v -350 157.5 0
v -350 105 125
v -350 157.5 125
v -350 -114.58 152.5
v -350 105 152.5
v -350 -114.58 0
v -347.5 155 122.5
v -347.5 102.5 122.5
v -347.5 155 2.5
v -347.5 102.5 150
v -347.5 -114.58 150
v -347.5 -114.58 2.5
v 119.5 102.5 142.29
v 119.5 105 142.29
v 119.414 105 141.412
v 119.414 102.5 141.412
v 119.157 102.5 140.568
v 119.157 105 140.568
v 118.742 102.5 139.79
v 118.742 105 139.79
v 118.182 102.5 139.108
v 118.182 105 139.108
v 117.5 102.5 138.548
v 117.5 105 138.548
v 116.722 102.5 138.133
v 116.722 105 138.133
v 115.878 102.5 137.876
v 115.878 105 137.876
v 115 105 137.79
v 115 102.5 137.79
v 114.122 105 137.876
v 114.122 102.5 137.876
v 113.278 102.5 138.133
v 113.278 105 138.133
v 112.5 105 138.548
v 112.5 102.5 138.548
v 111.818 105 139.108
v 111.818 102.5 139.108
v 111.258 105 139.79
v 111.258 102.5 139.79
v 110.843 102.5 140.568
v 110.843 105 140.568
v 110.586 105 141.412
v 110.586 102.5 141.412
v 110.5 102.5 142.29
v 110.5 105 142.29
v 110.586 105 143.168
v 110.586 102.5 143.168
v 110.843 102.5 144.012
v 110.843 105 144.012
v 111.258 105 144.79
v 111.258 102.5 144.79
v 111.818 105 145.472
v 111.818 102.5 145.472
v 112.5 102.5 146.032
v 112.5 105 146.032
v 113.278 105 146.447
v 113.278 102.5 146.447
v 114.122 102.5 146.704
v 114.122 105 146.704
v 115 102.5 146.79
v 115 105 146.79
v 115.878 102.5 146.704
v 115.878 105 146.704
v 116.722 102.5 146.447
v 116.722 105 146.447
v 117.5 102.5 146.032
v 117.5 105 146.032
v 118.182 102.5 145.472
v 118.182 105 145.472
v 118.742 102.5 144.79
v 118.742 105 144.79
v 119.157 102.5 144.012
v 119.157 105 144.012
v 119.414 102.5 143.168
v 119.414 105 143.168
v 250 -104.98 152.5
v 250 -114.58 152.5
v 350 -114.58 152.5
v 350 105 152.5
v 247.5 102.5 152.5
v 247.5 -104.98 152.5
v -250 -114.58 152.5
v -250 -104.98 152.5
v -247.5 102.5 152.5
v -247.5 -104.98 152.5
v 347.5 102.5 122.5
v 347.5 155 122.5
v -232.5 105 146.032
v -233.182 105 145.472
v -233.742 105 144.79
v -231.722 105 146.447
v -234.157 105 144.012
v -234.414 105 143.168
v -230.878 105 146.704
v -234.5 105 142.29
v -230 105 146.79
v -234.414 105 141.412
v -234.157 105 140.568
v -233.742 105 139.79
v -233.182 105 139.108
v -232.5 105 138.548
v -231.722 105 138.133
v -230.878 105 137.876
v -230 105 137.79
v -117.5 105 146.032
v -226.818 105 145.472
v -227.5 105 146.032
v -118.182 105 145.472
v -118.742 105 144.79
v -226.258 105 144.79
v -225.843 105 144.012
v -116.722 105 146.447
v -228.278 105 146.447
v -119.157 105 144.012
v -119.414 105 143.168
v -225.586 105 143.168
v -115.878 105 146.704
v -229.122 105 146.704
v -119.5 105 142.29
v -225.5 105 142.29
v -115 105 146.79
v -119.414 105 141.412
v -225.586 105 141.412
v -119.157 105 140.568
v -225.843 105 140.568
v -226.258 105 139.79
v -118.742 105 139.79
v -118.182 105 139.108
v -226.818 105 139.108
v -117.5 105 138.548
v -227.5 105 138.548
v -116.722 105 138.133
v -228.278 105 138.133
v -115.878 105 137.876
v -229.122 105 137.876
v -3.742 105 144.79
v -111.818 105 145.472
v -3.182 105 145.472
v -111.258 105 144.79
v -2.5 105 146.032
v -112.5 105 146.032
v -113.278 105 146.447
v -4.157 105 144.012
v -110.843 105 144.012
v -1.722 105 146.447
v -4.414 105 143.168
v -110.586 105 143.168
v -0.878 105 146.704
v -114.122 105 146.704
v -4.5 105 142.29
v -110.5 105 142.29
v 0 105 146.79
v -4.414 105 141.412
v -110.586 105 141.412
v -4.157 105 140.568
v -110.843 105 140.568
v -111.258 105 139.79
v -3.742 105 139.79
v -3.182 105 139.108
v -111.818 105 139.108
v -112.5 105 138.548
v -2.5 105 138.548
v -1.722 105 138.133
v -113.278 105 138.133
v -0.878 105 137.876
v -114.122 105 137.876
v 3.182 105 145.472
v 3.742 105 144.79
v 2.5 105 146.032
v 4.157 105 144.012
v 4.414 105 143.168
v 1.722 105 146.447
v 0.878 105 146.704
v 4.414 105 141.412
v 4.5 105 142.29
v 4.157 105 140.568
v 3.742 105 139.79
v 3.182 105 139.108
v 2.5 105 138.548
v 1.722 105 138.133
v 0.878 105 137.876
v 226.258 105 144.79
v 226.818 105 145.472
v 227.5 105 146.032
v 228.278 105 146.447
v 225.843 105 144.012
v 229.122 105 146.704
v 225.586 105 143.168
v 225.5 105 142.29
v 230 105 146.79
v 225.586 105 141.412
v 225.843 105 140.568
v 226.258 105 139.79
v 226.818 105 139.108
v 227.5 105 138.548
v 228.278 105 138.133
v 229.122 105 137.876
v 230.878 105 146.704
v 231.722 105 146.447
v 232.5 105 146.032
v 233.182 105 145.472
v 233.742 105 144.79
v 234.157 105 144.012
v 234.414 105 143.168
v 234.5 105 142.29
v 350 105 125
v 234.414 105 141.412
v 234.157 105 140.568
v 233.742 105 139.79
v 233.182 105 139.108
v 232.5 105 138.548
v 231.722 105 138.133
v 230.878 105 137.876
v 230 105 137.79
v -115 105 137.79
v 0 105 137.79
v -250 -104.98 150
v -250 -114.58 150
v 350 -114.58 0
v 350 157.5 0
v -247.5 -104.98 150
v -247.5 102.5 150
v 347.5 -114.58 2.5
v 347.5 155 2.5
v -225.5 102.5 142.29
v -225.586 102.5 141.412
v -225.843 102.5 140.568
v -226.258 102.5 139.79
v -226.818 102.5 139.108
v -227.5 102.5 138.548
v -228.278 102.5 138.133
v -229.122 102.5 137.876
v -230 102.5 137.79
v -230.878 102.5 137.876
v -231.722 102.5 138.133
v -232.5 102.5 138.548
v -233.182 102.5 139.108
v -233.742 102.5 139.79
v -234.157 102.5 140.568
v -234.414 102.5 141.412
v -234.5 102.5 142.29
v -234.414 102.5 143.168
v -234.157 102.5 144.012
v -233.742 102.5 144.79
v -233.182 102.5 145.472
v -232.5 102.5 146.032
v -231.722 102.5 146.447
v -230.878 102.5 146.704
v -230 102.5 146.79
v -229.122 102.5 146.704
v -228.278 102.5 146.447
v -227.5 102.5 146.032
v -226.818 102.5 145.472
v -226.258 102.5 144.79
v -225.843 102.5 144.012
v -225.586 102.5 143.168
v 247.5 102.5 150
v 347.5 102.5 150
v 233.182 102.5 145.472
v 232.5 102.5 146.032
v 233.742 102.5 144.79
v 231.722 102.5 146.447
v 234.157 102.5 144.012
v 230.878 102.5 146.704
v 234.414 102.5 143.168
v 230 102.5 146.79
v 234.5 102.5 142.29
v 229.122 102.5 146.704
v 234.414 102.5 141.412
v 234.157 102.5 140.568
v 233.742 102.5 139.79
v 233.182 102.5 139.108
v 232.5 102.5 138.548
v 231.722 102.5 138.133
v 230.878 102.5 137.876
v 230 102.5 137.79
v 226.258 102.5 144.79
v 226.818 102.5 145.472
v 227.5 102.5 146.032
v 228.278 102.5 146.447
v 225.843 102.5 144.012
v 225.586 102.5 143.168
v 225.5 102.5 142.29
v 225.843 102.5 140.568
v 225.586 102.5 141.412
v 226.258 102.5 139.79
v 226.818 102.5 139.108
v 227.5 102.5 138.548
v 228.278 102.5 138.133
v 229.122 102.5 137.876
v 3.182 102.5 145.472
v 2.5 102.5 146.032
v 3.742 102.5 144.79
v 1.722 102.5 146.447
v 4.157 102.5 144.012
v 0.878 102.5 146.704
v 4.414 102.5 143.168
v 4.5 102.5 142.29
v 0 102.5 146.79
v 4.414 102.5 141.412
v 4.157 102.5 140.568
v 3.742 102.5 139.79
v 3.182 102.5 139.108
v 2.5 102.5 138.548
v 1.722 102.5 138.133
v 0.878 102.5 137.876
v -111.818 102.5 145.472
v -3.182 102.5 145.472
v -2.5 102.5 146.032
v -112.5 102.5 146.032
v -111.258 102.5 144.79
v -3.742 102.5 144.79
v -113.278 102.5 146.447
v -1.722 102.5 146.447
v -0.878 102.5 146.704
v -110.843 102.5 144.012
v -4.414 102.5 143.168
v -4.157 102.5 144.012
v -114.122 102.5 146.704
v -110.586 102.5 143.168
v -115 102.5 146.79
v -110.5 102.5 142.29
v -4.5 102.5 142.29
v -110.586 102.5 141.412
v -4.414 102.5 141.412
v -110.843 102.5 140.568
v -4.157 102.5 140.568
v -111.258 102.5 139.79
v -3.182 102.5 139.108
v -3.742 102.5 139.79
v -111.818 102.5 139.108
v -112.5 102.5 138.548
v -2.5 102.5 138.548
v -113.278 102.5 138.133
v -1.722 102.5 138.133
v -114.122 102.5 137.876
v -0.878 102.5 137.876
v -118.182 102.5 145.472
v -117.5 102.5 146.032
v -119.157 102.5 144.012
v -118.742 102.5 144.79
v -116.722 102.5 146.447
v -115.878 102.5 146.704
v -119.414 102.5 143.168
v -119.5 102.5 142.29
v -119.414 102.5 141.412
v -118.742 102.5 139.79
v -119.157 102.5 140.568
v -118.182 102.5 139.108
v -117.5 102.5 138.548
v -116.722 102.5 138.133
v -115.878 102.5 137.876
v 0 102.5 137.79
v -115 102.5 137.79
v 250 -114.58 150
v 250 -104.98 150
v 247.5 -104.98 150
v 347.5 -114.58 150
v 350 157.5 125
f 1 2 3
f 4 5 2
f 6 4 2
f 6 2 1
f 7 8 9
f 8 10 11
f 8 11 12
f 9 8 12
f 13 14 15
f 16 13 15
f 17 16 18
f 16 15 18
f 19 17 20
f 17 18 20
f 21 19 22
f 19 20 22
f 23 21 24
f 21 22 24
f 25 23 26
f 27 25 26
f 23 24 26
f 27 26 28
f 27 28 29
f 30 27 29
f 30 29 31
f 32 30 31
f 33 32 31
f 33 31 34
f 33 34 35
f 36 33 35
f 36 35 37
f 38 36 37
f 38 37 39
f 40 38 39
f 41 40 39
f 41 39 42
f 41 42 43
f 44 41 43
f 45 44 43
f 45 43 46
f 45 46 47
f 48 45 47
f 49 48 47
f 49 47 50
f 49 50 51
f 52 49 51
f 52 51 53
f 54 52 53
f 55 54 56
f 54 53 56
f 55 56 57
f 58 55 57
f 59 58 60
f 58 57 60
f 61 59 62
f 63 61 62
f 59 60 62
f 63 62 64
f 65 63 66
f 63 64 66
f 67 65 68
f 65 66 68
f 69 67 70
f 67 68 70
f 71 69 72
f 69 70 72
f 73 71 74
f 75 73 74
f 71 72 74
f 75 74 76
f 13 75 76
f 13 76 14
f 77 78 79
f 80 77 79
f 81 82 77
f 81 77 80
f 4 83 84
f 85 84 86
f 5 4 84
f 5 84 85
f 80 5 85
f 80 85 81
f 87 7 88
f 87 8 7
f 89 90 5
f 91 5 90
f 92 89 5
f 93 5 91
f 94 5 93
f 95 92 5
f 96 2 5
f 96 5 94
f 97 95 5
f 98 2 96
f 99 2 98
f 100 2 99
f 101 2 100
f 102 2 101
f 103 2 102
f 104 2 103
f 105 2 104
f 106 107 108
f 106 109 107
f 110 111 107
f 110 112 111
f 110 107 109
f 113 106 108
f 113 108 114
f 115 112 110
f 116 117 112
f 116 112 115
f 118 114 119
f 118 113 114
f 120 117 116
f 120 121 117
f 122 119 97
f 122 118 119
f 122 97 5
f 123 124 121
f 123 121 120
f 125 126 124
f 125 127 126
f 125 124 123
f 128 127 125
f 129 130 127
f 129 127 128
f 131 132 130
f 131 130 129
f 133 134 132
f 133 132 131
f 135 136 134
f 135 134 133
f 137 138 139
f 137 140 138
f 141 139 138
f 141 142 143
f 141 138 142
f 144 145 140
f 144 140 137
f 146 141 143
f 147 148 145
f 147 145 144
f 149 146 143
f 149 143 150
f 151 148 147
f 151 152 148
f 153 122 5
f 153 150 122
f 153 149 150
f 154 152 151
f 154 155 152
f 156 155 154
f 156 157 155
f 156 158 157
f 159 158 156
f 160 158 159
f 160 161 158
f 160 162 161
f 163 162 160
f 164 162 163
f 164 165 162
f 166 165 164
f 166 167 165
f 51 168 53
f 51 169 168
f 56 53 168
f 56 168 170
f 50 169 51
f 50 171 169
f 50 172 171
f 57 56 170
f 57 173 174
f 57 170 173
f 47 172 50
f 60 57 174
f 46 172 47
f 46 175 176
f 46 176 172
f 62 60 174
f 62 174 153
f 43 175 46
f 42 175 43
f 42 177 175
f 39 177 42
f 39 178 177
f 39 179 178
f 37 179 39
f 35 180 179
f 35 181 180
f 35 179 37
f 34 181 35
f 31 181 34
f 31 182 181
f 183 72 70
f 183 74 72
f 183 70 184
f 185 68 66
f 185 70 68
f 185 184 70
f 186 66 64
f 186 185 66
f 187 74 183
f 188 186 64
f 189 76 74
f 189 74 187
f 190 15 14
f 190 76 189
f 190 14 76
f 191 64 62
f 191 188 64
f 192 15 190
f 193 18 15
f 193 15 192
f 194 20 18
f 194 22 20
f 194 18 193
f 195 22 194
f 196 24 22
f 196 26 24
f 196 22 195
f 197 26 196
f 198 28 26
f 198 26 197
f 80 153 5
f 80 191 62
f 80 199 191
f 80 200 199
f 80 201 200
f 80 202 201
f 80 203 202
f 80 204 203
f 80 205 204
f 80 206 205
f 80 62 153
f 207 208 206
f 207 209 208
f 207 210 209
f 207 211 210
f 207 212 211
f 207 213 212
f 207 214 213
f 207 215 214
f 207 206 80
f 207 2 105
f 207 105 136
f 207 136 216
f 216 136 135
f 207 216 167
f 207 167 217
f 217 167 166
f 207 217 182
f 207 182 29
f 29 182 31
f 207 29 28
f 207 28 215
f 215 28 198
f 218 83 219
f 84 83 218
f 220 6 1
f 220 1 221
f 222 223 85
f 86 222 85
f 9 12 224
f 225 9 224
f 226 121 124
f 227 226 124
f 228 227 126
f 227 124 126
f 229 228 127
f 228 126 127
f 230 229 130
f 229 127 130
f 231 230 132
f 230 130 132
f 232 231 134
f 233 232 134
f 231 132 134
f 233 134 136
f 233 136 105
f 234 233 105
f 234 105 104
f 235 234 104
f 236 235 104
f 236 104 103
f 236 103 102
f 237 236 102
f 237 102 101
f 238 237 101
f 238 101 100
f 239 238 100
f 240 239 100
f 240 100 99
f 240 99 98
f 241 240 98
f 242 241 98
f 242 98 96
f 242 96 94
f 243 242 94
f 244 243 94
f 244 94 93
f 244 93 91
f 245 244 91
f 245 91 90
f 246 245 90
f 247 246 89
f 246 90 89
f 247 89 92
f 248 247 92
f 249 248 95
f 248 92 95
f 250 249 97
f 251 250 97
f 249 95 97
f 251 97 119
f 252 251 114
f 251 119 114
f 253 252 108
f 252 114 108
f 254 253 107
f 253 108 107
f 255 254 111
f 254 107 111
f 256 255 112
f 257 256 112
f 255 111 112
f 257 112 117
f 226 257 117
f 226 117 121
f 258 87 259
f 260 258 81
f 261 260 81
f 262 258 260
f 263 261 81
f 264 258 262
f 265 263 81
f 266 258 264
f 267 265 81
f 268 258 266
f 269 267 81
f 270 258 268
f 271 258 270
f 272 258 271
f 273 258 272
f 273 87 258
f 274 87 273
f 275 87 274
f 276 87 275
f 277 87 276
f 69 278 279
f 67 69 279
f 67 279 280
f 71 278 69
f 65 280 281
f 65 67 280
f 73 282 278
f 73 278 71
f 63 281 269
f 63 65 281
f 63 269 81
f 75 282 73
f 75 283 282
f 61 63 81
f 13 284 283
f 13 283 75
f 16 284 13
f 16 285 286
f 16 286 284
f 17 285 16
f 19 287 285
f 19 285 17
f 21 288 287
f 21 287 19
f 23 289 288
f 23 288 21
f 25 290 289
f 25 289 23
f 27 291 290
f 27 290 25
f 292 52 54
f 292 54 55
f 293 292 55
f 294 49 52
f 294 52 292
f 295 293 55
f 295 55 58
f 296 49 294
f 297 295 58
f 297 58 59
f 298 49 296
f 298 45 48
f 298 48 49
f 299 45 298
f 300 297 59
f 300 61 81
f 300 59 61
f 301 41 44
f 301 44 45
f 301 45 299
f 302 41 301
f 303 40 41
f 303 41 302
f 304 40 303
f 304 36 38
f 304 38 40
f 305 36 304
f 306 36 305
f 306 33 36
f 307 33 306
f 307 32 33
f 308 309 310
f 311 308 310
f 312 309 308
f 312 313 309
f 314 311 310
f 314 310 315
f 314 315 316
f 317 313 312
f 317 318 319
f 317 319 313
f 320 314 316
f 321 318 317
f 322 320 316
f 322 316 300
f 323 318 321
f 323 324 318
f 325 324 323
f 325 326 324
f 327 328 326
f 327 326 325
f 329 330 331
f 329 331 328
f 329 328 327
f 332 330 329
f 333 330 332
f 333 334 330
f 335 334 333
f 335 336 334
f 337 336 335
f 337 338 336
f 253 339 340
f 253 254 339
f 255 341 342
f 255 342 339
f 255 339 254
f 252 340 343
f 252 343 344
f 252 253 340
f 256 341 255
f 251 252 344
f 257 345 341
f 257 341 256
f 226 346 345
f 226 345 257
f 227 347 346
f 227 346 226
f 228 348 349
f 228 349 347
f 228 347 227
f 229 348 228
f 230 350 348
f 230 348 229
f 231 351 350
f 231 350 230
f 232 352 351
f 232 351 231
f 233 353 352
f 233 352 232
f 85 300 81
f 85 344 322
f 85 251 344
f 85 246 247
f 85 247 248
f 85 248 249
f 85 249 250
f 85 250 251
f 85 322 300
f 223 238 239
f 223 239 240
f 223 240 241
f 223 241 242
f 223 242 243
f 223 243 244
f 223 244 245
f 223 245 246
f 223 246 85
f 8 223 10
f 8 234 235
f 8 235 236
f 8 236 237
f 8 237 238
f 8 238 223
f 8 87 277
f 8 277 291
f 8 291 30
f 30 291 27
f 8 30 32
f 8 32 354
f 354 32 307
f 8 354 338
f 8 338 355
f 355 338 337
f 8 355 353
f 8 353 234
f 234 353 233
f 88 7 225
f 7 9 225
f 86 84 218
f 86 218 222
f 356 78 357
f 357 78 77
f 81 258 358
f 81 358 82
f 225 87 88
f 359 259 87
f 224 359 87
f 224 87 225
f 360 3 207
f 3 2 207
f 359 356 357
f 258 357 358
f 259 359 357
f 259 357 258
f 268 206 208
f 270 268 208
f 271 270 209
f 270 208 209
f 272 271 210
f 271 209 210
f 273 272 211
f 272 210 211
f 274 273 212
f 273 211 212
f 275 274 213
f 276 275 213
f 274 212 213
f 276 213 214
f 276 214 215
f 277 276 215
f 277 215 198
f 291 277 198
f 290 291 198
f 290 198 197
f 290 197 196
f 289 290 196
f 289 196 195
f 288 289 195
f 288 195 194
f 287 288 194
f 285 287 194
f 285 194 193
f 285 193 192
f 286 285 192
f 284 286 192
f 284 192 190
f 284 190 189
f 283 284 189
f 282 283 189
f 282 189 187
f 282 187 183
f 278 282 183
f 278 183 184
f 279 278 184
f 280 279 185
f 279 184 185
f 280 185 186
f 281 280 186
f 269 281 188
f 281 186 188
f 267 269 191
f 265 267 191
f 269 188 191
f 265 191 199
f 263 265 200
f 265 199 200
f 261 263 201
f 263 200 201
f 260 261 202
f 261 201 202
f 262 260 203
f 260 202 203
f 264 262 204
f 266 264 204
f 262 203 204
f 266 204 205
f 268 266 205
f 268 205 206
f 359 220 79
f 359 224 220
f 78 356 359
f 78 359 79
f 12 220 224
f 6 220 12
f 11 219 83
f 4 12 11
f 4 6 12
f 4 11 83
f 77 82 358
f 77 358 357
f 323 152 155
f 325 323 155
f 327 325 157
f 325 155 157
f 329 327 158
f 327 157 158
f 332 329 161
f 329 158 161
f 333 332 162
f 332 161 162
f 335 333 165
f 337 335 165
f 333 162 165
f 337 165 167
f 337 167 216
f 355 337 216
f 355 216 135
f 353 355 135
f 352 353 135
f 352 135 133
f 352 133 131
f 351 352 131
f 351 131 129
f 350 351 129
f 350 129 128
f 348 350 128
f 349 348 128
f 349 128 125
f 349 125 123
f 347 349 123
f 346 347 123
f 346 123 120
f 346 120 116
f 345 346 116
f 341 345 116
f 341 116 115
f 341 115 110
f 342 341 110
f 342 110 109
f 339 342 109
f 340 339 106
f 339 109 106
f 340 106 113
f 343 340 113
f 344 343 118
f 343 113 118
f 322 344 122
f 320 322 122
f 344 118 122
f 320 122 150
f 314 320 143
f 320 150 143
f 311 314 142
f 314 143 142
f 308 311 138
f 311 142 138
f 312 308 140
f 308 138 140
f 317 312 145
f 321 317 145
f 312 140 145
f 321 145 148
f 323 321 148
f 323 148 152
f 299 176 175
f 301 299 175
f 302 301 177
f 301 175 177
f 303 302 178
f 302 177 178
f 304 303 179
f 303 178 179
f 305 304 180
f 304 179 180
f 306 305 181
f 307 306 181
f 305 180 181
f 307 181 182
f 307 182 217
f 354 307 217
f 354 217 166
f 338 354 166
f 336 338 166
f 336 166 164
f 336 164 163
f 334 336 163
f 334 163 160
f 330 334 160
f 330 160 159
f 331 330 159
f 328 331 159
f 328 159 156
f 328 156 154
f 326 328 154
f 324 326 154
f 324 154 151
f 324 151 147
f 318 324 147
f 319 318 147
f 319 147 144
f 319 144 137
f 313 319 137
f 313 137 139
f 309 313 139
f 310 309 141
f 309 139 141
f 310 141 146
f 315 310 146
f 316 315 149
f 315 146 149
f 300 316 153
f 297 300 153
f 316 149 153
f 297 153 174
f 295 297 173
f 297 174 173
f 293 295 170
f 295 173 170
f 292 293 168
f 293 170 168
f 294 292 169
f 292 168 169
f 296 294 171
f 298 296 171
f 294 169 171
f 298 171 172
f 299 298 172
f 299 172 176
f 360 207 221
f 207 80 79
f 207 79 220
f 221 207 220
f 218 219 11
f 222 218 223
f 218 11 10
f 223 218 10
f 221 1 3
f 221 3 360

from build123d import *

# Parameters (mm, degrees)
ESBO_O1_W                = 700
ESBO_O1_H                = 210
RESSALTO_EXTRUS_O1_DEPTH = 2.5
RESSALTO_EXTRUS_O2_DEPTH = 150
CORTE_EXTRUS_O3_REACH    = 212
ESBO_O3_W                = 695
ESBO_O3_H                = 120
RESSALTO_EXTRUS_O5_DEPTH = 9.58
ESBO_O7_W                = 2.5
ESBO_O7_H                = 217.08
RESSALTO_EXTRUS_O6_DEPTH = 100
ESBO_O9_W                = 2.5
ESBO_O9_H                = 9.6
CORTE_EXTRUS_O4_DEPTH    = 9.5
ESBO_O10_R               = 4.5
CORTE_EXTRUS_O5_DEPTH    = 3
ESBO_O11_W               = 700
ESBO_O11_H               = 125
ESBO_O11_W_2             = 695
ESBO_O11_H_2             = 120
RESSALTO_EXTRUS_O7_DEPTH = 50
ESBO_O12_W               = 700
ESBO_O12_H               = 125
RESSALTO_EXTRUS_O8_DEPTH = 2.5


with BuildPart() as part:
    # Esboço1 → Ressalto-extrusão1 (new body)
    with BuildSketch(Plane.XY):
        Rectangle(ESBO_O1_W, ESBO_O1_H)
    extrude(amount=RESSALTO_EXTRUS_O1_DEPTH)

    # Esboço2 → Ressalto-extrusão2 (add)
    with BuildSketch(Plane.XY.offset(2.5)):
        Polygon((-347.5, 102.5), (-347.5, -105), (-350, -105), (-350, 105), (350, 105), (350, -105), (347.5, -105), (347.5, 102.5), align=None)
    extrude(amount=RESSALTO_EXTRUS_O2_DEPTH)

    # Esboço3 → Corte-extrusão3 (cut, up to next)
    with BuildSketch(Plane(origin=(0, 105, 0), x_dir=(1, 0, 0), z_dir=(0, 1, 0)), mode=Mode.PRIVATE) as corte_extrus_o3_sk1:
        with Locations((0, -62.5)):
            Rectangle(ESBO_O3_W, ESBO_O3_H)
    corte_extrus_o3_tool1 = extrude(corte_extrus_o3_sk1.sketch, amount=-CORTE_EXTRUS_O3_REACH, mode=Mode.PRIVATE) & part.part
    add(corte_extrus_o3_tool1.solids().sort_by_distance((0, 105, 62.5))[0], mode=Mode.SUBTRACT)

    # Esboço6 → Ressalto-extrusão5 (add)
    with BuildSketch(Plane.XZ.offset(105)):
        Polygon((350, 0), (350, 152.5), (347.5, 152.5), (347.5, 2.5), (-347.5, 2.5), (-347.5, 152.5), (-350, 152.5), (-350, 0), align=None)
    extrude(amount=RESSALTO_EXTRUS_O5_DEPTH)

    # Esboço7 → Ressalto-extrusão6 (add)
    with BuildSketch(Plane.ZY.offset(-347.5)):
        with Locations((151.25, -6.04)):
            Rectangle(ESBO_O7_W, ESBO_O7_H)
    ressalto_extrus_o6 = extrude(amount=RESSALTO_EXTRUS_O6_DEPTH)

    # Espelhar1: Ressalto-extrusão6 across plane
    add(ressalto_extrus_o6.mirror(Plane(origin=(0, 0, 0), x_dir=(0, 0, 1), z_dir=(1, 0, 0))))

    # Esboço9 → Corte-extrusão4 (cut)
    with BuildSketch(Plane.XY.offset(152.5)):
        with Locations((-248.75, -109.78)):
            Rectangle(ESBO_O9_W, ESBO_O9_H)
        with Locations((248.75, -109.78)):
            Rectangle(ESBO_O9_W, ESBO_O9_H)
    extrude(amount=-CORTE_EXTRUS_O4_DEPTH, mode=Mode.SUBTRACT)

    # Esboço10 → Corte-extrusão5 (cut)
    with BuildSketch(Plane(origin=(0, 105, 0), x_dir=(1, 0, 0), z_dir=(0, 1, 0))):
        with Locations((-230, -142.29)):
            Circle(ESBO_O10_R)
        with Locations((-115, -142.29)):
            Circle(ESBO_O10_R)
        with Locations((0, -142.29)):
            Circle(ESBO_O10_R)
        with Locations((115, -142.29)):
            Circle(ESBO_O10_R)
        with Locations((230, -142.29)):
            Circle(ESBO_O10_R)
    extrude(amount=-CORTE_EXTRUS_O5_DEPTH, mode=Mode.SUBTRACT)

    # Esboço11 → Ressalto-extrusão7 (add)
    with BuildSketch(Plane(origin=(0, 105, 0), x_dir=(1, 0, 0), z_dir=(0, 1, 0))):
        with Locations((0, -62.5)):
            Rectangle(ESBO_O11_W, ESBO_O11_H)
        with Locations((0, -62.5)):
            Rectangle(ESBO_O11_W_2, ESBO_O11_H_2, mode=Mode.SUBTRACT)
    extrude(amount=RESSALTO_EXTRUS_O7_DEPTH)

    # Esboço12 → Ressalto-extrusão8 (add)
    with BuildSketch(Plane(origin=(0, 155, 0), x_dir=(1, 0, 0), z_dir=(0, 1, 0))):
        with Locations((0, -62.5)):
            Rectangle(ESBO_O12_W, ESBO_O12_H)
    extrude(amount=RESSALTO_EXTRUS_O8_DEPTH)


solid = part.part
